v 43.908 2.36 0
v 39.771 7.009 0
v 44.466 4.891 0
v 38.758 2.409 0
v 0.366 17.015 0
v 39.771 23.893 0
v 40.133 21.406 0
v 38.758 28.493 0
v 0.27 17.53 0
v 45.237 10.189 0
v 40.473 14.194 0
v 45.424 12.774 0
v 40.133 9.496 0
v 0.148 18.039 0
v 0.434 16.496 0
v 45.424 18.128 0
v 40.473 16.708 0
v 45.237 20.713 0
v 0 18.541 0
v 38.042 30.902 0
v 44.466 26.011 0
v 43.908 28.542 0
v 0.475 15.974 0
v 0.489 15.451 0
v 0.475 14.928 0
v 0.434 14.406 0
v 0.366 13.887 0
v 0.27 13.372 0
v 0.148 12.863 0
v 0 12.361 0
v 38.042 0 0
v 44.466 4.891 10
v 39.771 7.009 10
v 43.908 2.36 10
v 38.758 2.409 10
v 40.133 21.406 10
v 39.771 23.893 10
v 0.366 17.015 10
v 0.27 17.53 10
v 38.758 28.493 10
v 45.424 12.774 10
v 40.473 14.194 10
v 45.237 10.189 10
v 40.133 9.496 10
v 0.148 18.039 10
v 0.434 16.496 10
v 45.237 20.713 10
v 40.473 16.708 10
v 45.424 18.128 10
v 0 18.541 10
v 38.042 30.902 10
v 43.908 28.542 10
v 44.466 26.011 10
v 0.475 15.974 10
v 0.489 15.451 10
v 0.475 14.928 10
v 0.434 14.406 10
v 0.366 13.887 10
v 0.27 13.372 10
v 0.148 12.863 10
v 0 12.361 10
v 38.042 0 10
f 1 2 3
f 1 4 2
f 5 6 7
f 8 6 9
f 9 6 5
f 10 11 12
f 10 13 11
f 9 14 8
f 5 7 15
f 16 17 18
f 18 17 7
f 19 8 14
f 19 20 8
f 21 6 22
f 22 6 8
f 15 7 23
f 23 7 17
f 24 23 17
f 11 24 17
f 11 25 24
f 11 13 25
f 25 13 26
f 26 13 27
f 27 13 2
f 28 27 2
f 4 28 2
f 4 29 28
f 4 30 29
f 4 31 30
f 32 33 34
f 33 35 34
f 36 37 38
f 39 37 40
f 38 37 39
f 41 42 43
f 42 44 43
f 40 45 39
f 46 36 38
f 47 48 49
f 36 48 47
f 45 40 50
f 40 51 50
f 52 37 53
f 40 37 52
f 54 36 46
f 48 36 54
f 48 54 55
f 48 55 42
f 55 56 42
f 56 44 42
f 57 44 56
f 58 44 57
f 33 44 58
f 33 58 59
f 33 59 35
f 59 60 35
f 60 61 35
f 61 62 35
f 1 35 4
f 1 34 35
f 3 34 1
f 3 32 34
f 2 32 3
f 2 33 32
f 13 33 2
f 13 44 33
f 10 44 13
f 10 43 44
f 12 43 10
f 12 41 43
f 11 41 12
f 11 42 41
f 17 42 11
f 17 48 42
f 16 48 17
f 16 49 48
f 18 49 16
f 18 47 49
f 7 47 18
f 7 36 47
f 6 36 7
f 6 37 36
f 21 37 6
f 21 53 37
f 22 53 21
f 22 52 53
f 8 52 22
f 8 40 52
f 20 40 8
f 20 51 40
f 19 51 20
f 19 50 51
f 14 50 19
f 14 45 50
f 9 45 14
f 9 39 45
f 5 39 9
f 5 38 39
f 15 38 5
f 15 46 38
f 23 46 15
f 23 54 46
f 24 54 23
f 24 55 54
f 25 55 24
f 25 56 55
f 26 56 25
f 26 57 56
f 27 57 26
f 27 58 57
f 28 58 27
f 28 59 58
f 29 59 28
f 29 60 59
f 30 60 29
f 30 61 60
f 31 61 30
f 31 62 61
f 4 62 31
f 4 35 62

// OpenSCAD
$fn = 32;

// ----------------------------------------------------------------------
// Gear sector: 4 teeth on 36 degrees
// ----------------------------------------------------------------------

// --- parameters (mm) ---
sector_angle = 36;        // sector angle, degrees
root_r = 50;              // root circle radius
tooth_h = 5;              // tooth height over the root circle
teeth = 4;                // number of teeth on the sector
hub_r = 10;               // hub bore radius
plate_t = 10;             // sector thickness, Z
arc_step = 3;             // sampling step of the root/hub arcs, degrees

tip_r = root_r + tooth_h;  // tip circle radius

profile = [[38.042, 0], [38.758, 2.409], [43.908, 2.36], [44.466, 4.891], [39.771, 7.009], [40.133, 9.496], [45.237, 10.189], [45.424, 12.774], [40.473, 14.194], [40.473, 16.708], [45.424, 18.128], [45.237, 20.713], [40.133, 21.406], [39.771, 23.893], [44.466, 26.011], [43.908, 28.542], [38.758, 28.493], [38.042, 30.902], [0, 18.541], [0.148, 18.039], [0.27, 17.53], [0.366, 17.015], [0.434, 16.496], [0.475, 15.974], [0.489, 15.451], [0.475, 14.928], [0.434, 14.406], [0.366, 13.887], [0.27, 13.372], [0.148, 12.863], [0, 12.361]];  // primary outline, 31 points, counter clockwise

// --- the one profile operation ---
linear_extrude(height = plate_t) polygon(points = profile);
